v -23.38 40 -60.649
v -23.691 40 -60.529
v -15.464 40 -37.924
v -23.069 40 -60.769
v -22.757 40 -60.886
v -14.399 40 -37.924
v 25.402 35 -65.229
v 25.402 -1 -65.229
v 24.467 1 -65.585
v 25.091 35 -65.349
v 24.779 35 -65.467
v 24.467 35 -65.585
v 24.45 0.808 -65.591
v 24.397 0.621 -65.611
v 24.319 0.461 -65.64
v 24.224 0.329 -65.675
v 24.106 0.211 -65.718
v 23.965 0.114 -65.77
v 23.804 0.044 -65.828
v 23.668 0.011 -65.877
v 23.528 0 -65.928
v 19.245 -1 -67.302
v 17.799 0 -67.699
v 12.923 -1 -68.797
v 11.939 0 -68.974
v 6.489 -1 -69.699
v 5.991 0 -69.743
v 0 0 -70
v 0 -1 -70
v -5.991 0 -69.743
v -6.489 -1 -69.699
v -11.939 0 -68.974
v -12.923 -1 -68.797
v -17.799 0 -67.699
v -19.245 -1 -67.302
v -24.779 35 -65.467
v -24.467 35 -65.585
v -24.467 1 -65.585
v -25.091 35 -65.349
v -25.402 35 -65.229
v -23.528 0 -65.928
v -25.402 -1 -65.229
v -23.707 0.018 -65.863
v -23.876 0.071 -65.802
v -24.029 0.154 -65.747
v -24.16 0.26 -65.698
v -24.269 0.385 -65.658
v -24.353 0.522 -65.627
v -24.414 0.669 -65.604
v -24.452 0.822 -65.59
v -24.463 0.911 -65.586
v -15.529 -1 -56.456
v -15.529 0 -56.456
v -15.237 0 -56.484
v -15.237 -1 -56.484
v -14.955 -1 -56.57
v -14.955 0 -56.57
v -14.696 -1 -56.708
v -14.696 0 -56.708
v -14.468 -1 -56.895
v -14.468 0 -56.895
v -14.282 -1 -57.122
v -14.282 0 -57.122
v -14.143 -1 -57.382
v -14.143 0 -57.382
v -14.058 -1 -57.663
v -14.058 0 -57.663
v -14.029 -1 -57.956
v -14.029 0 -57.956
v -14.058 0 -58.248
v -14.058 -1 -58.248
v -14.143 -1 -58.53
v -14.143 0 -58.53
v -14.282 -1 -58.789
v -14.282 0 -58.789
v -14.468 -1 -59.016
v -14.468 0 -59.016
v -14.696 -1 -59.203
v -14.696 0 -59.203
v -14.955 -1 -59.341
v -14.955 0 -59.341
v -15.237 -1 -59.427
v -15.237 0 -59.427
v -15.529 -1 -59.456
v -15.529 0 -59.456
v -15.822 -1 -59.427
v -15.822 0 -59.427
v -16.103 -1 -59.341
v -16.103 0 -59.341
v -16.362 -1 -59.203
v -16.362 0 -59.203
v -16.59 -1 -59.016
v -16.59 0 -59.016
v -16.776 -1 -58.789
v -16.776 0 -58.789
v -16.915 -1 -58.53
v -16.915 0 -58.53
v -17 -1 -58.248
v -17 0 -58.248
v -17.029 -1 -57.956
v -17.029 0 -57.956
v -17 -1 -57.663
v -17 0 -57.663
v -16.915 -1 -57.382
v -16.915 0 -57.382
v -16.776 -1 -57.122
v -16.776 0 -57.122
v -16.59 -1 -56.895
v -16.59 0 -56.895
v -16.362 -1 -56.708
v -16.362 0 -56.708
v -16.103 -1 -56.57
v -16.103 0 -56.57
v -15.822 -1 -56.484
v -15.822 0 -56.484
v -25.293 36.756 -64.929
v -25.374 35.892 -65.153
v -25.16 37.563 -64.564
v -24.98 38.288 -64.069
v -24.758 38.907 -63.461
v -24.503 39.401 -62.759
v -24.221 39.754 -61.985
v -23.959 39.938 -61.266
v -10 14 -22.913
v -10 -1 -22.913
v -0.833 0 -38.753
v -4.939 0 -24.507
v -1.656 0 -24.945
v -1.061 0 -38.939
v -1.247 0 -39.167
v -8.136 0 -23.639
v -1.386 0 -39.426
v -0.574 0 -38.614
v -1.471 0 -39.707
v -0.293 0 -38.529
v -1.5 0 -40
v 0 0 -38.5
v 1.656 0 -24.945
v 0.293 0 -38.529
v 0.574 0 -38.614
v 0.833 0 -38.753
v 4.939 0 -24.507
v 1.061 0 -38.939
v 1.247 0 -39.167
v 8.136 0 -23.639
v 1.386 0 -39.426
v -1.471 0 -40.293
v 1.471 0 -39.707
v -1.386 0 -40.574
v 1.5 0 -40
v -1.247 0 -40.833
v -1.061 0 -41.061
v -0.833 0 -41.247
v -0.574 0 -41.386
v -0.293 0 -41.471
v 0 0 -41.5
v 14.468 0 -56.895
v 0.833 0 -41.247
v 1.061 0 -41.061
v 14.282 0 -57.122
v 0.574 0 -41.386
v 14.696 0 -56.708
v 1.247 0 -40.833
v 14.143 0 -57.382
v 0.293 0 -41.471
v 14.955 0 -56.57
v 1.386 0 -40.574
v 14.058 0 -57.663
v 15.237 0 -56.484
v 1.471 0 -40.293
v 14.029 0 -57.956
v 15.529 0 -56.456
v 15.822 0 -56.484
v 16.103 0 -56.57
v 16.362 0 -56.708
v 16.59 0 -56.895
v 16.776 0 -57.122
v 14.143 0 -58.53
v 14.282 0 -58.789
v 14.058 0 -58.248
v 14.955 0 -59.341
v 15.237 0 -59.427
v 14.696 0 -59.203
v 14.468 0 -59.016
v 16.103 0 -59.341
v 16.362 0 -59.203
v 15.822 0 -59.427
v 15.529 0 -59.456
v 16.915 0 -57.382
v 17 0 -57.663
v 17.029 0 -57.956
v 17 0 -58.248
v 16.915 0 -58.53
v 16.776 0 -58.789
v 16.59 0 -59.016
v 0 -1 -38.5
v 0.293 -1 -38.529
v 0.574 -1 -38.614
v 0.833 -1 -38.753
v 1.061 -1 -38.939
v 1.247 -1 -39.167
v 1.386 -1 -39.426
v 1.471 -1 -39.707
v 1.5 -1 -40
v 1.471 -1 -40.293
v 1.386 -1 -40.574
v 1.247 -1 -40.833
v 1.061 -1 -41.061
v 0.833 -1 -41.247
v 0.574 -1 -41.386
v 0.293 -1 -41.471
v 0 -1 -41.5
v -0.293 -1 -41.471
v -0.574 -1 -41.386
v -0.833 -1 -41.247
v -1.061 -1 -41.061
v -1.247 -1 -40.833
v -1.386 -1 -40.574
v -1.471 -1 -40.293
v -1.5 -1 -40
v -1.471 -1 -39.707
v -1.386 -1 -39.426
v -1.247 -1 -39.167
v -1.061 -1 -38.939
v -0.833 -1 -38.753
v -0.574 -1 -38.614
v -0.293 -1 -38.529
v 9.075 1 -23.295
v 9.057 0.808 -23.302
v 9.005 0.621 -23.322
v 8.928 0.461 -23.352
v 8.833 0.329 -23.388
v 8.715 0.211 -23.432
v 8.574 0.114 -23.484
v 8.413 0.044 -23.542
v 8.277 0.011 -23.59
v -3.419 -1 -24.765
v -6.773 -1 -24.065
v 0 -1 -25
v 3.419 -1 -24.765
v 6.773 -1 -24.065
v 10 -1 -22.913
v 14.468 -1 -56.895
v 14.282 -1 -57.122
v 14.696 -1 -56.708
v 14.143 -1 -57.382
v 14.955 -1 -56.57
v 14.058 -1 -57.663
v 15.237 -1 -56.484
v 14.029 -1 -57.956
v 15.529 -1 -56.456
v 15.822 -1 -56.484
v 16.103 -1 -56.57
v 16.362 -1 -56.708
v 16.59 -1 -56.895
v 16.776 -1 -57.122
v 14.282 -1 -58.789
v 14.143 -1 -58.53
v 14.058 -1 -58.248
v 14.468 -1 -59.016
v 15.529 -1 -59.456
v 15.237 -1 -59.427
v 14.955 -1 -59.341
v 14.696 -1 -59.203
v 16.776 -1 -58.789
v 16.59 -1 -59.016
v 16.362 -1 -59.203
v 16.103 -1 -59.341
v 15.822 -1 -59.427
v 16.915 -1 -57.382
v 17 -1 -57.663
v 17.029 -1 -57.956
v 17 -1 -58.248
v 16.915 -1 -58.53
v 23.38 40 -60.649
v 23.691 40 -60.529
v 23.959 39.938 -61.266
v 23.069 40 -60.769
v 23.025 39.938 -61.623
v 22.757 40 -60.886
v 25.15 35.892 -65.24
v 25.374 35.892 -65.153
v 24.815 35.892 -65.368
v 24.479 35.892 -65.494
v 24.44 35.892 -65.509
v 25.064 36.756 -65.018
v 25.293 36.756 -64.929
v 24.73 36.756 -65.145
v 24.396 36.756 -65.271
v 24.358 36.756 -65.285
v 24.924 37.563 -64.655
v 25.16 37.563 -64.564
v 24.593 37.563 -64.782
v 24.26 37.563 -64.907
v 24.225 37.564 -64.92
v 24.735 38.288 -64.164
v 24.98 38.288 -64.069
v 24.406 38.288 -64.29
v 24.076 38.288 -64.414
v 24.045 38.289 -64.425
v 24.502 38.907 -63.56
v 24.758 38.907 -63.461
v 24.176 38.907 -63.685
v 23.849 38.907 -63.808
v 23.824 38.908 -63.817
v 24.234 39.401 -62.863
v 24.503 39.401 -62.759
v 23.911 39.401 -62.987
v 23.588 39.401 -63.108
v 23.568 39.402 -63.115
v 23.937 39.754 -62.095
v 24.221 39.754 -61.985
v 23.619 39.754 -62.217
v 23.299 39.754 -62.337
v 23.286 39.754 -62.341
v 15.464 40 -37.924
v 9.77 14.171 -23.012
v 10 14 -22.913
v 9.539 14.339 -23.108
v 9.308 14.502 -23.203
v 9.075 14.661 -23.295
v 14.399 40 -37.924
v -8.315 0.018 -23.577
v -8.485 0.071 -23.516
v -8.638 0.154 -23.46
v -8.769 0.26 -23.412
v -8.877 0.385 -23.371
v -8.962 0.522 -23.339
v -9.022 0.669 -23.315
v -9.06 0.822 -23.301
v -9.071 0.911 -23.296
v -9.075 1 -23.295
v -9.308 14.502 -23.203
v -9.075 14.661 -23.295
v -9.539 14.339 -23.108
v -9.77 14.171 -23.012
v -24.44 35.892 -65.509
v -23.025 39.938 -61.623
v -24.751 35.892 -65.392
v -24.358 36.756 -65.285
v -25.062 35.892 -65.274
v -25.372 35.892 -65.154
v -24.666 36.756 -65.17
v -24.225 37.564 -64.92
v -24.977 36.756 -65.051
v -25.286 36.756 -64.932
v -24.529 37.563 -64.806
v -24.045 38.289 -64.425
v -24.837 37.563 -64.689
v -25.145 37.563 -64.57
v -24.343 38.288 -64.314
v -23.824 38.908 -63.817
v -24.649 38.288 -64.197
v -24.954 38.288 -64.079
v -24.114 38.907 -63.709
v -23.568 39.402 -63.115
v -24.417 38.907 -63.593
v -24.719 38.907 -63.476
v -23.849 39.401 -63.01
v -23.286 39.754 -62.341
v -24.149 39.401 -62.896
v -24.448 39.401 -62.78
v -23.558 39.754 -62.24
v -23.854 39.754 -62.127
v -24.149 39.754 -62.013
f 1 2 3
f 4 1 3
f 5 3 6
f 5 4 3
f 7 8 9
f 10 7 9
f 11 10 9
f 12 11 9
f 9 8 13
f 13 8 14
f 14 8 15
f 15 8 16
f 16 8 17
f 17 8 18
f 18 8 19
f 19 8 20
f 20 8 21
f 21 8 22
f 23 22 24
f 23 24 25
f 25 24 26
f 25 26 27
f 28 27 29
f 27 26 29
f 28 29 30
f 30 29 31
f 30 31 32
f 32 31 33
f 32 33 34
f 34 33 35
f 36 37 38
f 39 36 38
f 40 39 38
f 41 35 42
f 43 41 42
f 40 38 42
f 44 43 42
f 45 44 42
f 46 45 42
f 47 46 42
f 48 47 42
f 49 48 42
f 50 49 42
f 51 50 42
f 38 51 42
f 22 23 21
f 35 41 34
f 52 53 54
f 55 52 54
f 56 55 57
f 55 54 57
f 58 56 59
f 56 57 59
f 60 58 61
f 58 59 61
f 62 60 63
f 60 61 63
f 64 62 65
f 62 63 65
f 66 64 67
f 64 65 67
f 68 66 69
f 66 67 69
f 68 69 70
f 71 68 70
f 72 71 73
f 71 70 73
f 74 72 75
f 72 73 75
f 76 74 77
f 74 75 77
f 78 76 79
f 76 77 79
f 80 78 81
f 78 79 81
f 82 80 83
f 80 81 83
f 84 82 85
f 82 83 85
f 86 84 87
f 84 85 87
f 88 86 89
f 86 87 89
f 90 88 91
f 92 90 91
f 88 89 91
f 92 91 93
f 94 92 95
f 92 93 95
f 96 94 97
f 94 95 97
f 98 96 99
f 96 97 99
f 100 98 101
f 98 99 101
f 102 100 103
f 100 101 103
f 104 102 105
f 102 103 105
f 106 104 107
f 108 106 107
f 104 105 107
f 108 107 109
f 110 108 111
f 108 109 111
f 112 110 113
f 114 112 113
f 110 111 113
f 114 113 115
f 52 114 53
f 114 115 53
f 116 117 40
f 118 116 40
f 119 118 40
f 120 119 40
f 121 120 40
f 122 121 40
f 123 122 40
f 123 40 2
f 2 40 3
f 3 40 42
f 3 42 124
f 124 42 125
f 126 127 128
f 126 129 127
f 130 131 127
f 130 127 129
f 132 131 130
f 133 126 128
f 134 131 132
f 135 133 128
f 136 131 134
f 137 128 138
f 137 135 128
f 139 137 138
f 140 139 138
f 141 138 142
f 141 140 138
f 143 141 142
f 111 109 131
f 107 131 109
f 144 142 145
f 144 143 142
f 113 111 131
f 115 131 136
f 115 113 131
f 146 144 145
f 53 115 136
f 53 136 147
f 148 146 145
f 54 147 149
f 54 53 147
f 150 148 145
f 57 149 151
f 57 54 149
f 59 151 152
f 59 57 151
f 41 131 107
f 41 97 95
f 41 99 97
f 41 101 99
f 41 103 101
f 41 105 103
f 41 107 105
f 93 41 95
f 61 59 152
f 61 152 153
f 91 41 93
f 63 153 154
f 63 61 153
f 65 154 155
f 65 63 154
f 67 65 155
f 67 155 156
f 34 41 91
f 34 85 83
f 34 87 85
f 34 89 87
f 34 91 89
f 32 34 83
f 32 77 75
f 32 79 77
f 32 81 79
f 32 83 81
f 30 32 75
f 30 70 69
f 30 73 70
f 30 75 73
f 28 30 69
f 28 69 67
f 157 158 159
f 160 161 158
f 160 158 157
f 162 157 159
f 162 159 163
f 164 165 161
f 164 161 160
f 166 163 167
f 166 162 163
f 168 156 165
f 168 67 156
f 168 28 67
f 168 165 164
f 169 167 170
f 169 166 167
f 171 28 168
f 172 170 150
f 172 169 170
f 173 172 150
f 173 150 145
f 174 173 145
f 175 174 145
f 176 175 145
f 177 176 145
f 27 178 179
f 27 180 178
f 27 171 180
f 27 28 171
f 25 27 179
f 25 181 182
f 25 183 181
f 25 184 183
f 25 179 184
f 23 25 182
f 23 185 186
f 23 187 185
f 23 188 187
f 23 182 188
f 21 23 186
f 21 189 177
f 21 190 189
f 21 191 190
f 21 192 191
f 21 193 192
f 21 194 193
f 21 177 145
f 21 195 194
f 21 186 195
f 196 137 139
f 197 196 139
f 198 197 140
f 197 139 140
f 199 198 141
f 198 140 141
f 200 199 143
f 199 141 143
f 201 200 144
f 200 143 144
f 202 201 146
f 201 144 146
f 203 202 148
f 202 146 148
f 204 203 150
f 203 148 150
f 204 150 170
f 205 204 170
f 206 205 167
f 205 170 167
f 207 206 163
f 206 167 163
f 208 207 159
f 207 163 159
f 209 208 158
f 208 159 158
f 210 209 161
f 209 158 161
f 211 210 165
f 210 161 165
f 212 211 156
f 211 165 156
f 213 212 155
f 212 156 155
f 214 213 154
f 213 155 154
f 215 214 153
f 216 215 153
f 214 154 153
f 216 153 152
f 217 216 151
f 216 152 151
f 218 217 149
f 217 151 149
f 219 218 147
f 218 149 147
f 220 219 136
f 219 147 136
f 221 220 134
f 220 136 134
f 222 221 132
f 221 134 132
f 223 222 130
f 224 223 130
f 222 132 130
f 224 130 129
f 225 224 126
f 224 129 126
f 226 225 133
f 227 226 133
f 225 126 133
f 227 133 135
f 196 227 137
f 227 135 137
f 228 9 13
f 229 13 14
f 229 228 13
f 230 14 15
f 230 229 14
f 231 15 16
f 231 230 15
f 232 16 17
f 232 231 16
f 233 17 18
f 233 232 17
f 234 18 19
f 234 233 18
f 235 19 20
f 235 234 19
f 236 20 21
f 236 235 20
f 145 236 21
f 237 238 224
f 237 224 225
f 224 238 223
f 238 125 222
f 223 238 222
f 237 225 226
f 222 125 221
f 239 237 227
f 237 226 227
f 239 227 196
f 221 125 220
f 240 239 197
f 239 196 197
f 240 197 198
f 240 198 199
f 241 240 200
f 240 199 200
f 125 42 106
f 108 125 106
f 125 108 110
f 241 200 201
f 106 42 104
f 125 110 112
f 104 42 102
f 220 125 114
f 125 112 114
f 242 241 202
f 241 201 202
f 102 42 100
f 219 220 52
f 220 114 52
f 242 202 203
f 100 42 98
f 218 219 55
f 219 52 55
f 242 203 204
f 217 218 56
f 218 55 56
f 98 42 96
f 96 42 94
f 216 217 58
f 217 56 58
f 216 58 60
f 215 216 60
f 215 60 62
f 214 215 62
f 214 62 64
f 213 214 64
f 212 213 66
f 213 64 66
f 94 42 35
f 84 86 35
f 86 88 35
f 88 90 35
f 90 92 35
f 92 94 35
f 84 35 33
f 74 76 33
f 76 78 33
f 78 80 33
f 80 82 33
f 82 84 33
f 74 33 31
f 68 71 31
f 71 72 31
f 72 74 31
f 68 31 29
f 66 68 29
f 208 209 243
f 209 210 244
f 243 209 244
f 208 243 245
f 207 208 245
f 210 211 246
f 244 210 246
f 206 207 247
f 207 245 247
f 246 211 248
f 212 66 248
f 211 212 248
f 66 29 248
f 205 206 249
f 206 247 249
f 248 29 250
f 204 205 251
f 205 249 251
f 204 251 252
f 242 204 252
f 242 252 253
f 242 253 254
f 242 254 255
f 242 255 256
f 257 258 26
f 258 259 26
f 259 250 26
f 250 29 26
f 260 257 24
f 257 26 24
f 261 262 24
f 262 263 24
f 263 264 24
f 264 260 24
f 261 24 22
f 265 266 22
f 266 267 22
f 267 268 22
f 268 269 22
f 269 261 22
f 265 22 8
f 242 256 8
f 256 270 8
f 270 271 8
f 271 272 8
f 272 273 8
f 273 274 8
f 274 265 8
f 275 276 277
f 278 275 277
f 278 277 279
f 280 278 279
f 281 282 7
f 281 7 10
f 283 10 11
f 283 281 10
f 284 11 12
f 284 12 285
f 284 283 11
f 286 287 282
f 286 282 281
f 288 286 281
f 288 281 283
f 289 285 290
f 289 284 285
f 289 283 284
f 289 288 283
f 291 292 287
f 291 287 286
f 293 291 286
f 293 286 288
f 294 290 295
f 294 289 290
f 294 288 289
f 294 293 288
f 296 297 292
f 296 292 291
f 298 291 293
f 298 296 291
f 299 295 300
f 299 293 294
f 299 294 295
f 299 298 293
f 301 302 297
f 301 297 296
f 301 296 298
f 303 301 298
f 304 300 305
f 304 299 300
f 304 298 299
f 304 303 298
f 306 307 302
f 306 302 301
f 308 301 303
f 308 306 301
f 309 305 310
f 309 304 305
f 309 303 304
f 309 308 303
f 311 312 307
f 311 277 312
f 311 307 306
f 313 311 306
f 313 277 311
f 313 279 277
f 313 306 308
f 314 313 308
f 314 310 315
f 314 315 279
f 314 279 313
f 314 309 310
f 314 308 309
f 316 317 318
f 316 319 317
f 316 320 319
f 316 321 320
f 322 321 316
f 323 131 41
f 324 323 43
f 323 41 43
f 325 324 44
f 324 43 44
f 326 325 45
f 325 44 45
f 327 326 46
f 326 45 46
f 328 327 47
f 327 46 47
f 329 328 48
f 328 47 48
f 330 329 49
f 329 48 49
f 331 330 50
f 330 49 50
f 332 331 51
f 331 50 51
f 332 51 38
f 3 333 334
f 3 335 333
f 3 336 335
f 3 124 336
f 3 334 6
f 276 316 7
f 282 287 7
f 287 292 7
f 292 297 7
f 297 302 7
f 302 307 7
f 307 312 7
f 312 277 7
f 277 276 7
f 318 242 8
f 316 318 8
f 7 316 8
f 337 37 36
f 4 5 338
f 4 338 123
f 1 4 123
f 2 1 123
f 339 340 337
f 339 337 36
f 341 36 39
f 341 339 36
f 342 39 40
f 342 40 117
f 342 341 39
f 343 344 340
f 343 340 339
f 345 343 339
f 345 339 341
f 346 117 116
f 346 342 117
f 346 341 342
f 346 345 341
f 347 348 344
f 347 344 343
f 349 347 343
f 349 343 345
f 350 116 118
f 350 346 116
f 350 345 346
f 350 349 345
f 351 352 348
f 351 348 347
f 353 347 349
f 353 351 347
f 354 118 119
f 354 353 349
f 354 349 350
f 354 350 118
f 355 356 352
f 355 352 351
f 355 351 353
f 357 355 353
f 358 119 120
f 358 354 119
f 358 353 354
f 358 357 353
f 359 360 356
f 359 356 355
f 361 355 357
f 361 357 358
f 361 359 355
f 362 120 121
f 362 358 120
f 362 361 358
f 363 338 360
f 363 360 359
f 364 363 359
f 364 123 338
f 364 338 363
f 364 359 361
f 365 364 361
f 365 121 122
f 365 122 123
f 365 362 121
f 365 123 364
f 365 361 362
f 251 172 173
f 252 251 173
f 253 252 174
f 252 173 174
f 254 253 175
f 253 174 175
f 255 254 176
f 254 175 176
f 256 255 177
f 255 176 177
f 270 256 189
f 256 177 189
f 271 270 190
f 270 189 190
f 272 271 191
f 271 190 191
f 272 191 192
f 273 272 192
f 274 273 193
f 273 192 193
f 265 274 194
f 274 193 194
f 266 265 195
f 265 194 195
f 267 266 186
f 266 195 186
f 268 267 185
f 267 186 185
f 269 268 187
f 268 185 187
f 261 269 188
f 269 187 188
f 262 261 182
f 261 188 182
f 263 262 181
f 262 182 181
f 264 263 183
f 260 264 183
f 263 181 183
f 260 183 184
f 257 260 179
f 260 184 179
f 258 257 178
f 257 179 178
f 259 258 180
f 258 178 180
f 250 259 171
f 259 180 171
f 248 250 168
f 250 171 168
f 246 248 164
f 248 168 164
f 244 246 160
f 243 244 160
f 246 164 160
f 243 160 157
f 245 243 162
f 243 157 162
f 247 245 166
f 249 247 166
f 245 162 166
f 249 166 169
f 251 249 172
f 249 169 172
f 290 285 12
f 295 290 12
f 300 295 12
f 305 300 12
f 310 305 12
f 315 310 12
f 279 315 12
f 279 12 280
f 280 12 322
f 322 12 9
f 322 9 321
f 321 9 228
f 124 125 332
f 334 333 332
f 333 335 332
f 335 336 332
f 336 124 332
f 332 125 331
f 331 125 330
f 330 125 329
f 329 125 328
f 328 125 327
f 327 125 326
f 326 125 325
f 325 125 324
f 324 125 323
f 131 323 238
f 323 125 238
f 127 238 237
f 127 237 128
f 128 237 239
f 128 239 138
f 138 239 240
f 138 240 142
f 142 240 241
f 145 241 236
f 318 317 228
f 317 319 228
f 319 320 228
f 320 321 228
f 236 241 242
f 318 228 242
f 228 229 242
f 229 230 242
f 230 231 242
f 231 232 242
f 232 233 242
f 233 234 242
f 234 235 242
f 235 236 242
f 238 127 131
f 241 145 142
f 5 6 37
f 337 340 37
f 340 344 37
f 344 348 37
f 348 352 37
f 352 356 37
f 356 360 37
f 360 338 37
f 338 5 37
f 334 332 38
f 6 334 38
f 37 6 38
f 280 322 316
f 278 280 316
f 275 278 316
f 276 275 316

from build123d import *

# Parameters (mm, degrees)
BOSS_EXTRUDE2_DEPTH     = 40
BOSS_EXTRUDE2_2_DEPTH   = 40
BOSS_EXTRUDE3_START     = -1
BOSS_EXTRUDE3_DEPTH     = 1
FILLET1_R               = 1
FILLET2_R               = 5
CUT_EXTRUDE1_DEPTH      = 85.5295373443375
CUT_EXTRUDE1_DEPTH_BACK = 85.5295373443375
SKETCH4_R               = 1.5000000000000004
SKETCH4_R_2             = 1.5000000000000009
SKETCH4_R_3             = 1.4999999999999991
CUT_EXTRUDE2_DEPTH      = 1


with BuildPart() as part:
    # Sketch1 → Boss-Extrude2 (new body)
    with BuildSketch(Plane(origin=(0, 0, 0), x_dir=(1, 0, 0), z_dir=(0, 1, 0))):
        with BuildLine():
            Line((-25.401627045652027, 65.22850100556965), (-10, 22.912878474779202))
            ThreePointArc((-10.000000000000004, 22.912878474779205), (-9.53932578125167, 23.108467358073476), (-9.0748285709005, 23.294795264366854))
            Line((-9.074828570900502, 23.294795264366854), (-24.46711558509191, 65.58475626962223))
            ThreePointArc((-24.46711558509193, 65.58475626962225), (-24.935007566594734, 65.40829762082075), (-25.401627045652038, 65.22850100556964))
        make_face()
    extrude(amount=BOSS_EXTRUDE2_DEPTH)



with BuildPart() as body_2:
    # Sketch1 → Boss-Extrude2 2 (new body)
    with BuildSketch(Plane(origin=(0, 0, 0), x_dir=(1, 0, 0), z_dir=(0, 1, 0))):
        with BuildLine():
            Line((24.46711558509189, 65.58475626962225), (9.074828570900499, 23.294795264366847))
            ThreePointArc((9.0748285709005, 23.294795264366854), (9.53932578125167, 23.108467358073483), (10, 22.912878474779205))
            Line((10, 22.912878474779205), (25.401627045652017, 65.22850100556967))
            ThreePointArc((25.401627045652017, 65.22850100556967), (24.935007566594702, 65.40829762082078), (24.467115585091896, 65.58475626962228))
        make_face()
    extrude(amount=BOSS_EXTRUDE2_2_DEPTH)


with BuildPart() as part_1:
    add(part.part)

    add(body_2.part)  # Boss-Extrude3 merges body 2
    # Sketch1<5> → Boss-Extrude3 (add)
    with BuildSketch(Plane(origin=(0, 0, 0), x_dir=(1, 0, 0), z_dir=(0, 1, 0)).offset(BOSS_EXTRUDE3_START)):
        with BuildLine():
            Line((-25.401627045652027, 65.22850100556965), (-10, 22.912878474779202))
            ThreePointArc((-10, 22.912878474779205), (-8.9e-16, 25), (9.999999999999996, 22.912878474779205))
            Line((10, 22.912878474779205), (25.401627045652017, 65.22850100556967))
            ThreePointArc((25.401627045652017, 65.22850100556967), (-1.421e-14, 70.00000000000003), (-25.401627045652038, 65.22850100556964))
        make_face()
    extrude(amount=BOSS_EXTRUDE3_DEPTH)

    # Fillet1
    fillet1_edges = [part_1.edges().sort_by_distance(p)[0] for p in [
        (16.770972077996195, 0, -44.43977576699454),
        (-16.770972077996205, 0, -44.43977576699454),
    ]]
    fillet(fillet1_edges, radius=FILLET1_R)

    # Fillet2
    # the kernel refuses this fillet: 5 mm, written as the material it takes off along each edge
    with BuildSketch(Plane(origin=(4.656364e-11, 40, 1.1895196e-10), x_dir=(-0.1775518542225804, 0, -0.9841114464643339), z_dir=(0.9841114464643339, 0, -0.1775518542225804))) as fillet2_piece_1:
        with BuildLine():
            CenterArc((70.00000000012774 - FILLET2_R, -FILLET2_R), FILLET2_R, 0, 90)
            Line((70.00000000012774 - FILLET2_R, 0), (70.00000000012774, 0))
            Line((70.00000000012774, 0), (70.00000000012774, -FILLET2_R))
        make_face()
    revolve(axis=Axis((4.656364e-11, 40, 1.1895196e-10), (0, 1, 0)), revolution_arc=21.281391087786062, mode=Mode.SUBTRACT)
    with BuildSketch(Plane(origin=(-2.019185e-11, 40, 5.042011e-11), x_dir=(0.5226263256133499, 0, -0.8525618592078166), z_dir=(0.8525618592078166, 0, 0.5226263256133499))) as fillet2_piece_2:
        with BuildLine():
            CenterArc((70.00000000010422 - FILLET2_R, -FILLET2_R), FILLET2_R, 0, 89.99999999999983)
            Line((70.00000000010422 - FILLET2_R, 0), (70.00000000010422, 0))
            Line((70.00000000010422, 0), (70.00000000010421, -FILLET2_R))
        make_face()
    revolve(axis=Axis((-2.019185e-11, 40, 5.042011e-11), (0, 1, 0)), revolution_arc=21.281391087808515, mode=Mode.SUBTRACT)

    # Sketch3 → Cut-Extrude1 (cut, two sides: drawn at the far end of the back side and taken through both)
    with BuildSketch(Plane(origin=(0, 0, 0), x_dir=(0, 0, -1), z_dir=(1, 0, 0)).offset(-CUT_EXTRUDE1_DEPTH_BACK)):
        Polygon((22.912878474779205, 13.999999999999998), (37.92398547370926, 40), (22.912878474779205, 40), (17.723420287047986, 40), (17.723420287047986, 13.999999999999998), align=None)
    extrude(amount=CUT_EXTRUDE1_DEPTH + CUT_EXTRUDE1_DEPTH_BACK, mode=Mode.SUBTRACT)

    # Sketch4 → Cut-Extrude2 (cut)
    with BuildSketch(Plane(origin=(0, 0, 0), x_dir=(1, 0, 0), z_dir=(0, 1, 0))):
        with Locations(Location((2.4e-16, 40, 0), (0, 0, 270))):
            Circle(SKETCH4_R)
        with Locations(Location((-15.529142706151296, 57.95554957734408, 0), (0, 0, 270))):
            Circle(SKETCH4_R_2)
        with Locations(Location((15.529142706151275, 57.955549577344094, 0), (0, 0, 270))):
            Circle(SKETCH4_R_3)
    extrude(amount=-CUT_EXTRUDE2_DEPTH, mode=Mode.SUBTRACT)


solid = part_1.part
